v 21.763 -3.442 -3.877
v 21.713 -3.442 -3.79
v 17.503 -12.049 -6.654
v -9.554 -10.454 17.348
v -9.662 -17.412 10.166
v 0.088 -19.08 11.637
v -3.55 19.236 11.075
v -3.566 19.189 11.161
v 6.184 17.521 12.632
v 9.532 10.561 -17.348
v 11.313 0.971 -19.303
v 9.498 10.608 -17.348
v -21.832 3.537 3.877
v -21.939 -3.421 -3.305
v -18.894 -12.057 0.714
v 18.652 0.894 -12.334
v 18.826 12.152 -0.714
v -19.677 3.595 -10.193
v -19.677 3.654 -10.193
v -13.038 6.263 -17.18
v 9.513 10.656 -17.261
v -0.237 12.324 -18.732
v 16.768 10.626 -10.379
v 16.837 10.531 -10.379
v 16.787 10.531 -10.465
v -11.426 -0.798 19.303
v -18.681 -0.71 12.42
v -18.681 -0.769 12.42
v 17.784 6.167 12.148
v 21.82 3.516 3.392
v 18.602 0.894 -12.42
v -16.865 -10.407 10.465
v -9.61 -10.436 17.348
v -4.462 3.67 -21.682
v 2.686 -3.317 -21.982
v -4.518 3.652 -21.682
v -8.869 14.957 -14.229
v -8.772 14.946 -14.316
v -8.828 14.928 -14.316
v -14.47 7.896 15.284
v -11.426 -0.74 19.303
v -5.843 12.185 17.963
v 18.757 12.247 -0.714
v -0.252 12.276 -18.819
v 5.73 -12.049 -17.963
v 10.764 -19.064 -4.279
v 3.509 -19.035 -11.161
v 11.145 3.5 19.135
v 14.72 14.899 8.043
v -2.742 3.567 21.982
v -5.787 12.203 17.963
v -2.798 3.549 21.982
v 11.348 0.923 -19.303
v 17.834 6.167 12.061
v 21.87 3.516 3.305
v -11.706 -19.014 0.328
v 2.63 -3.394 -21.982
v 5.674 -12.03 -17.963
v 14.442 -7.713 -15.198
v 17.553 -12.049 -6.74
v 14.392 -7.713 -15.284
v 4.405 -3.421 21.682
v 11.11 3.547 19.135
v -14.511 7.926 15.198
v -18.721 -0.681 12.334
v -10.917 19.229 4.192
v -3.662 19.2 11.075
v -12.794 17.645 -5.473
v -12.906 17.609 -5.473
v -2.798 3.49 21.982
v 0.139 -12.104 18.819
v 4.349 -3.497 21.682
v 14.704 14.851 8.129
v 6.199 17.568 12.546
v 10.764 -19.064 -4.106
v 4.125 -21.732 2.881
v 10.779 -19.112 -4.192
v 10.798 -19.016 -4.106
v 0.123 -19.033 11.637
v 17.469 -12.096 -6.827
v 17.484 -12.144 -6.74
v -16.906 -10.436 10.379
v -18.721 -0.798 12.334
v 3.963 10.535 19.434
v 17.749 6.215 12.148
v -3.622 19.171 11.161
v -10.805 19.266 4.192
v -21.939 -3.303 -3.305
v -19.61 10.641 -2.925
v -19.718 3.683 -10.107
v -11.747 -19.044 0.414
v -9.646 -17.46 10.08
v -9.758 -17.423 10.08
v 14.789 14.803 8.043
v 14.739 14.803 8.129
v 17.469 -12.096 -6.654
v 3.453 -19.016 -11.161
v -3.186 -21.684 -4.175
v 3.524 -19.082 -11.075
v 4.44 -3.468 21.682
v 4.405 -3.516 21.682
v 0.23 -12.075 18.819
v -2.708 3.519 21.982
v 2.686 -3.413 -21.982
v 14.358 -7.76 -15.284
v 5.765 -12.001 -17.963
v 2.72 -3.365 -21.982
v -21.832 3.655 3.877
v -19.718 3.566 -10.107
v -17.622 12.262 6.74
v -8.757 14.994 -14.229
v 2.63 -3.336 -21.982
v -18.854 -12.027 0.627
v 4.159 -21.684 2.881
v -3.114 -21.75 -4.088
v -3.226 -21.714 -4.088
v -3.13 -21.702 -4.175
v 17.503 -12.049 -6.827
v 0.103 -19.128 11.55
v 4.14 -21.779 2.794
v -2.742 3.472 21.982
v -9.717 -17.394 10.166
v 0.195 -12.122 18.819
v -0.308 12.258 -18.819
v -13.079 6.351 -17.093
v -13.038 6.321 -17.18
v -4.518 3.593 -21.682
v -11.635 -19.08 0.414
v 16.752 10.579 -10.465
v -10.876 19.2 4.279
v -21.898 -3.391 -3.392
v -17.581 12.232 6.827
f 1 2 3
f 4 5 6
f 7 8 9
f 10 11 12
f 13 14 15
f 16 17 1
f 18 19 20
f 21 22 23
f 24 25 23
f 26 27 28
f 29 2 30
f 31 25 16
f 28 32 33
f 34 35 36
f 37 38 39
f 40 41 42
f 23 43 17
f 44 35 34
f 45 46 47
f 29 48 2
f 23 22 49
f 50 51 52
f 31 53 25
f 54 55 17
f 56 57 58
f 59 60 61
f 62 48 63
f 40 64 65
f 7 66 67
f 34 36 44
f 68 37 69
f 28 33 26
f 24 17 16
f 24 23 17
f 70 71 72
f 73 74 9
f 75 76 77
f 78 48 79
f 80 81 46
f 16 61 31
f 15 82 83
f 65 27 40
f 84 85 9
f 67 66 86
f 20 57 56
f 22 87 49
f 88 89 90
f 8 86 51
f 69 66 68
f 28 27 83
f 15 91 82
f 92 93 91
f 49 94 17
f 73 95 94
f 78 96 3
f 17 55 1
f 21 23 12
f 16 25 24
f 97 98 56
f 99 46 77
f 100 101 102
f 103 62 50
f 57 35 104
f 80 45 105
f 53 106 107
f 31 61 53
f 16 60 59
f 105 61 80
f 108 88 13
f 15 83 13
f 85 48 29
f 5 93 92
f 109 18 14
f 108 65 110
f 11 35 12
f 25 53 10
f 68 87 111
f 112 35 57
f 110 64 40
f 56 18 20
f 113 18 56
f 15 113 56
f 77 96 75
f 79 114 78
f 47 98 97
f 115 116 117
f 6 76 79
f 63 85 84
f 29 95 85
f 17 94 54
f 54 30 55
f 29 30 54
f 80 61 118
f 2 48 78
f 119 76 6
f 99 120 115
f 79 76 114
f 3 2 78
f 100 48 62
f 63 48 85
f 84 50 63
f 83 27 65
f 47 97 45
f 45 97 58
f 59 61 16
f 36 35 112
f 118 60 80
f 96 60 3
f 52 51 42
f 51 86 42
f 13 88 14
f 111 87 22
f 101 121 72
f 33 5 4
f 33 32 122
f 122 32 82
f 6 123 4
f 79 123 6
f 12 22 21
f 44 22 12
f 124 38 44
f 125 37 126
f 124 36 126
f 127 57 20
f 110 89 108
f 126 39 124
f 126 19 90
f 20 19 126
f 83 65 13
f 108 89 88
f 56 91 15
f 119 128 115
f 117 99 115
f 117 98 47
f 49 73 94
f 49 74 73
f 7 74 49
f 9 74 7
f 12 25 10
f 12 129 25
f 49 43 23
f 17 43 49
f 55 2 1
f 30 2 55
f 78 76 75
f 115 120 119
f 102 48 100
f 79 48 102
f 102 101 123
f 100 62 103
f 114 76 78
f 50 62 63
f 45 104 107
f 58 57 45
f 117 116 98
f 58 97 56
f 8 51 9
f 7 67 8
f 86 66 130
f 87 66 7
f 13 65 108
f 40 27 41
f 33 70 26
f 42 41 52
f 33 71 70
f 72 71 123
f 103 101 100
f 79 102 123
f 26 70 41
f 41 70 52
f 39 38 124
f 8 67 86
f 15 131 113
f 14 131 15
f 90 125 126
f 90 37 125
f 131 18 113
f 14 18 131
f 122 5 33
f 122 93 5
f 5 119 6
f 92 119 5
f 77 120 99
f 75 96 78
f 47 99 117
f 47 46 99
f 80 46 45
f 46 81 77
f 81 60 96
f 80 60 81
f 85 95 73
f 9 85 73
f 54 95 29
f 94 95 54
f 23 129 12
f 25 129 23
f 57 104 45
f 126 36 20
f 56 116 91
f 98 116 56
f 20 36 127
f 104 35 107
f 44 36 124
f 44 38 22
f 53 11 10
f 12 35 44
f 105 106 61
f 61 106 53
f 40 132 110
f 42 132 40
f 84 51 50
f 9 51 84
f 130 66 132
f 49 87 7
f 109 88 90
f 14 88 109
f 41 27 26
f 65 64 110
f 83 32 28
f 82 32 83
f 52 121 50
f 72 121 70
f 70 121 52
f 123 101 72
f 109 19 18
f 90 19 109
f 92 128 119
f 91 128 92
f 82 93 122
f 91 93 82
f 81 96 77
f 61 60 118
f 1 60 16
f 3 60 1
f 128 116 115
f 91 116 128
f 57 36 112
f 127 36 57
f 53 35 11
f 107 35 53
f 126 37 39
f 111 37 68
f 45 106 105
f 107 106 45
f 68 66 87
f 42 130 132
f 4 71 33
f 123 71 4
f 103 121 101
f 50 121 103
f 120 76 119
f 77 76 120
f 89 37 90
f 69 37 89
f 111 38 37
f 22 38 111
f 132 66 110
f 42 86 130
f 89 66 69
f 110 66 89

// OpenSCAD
// Auto-generated OpenSCAD file

    inner_points = 10*[[2.1663170564831677, -0.34419785617257703, -0.38765607758297516], [-1.442996025981491, 0.7866986144158923, 1.519751628063399], [1.8552345149142868, 0.08938090208747582, -1.233372999913796], [-1.7540785675503718, 1.2202773726759453, 0.6740347057325782], [1.7453064030745096, -1.2048588295271065, -0.6740347057325782], [-1.864006679390149, -0.07396235893863715, 1.233372999913796], [1.4342238615056286, -0.7712800712670536, -1.519751628063399], [-2.1750892209590305, 0.35961639932141576, 0.38765607758297516], [1.468891681862331, 1.4803448655131184, 0.8042791895681101], [0.6168484423213675, 1.7473133080865888, 1.2545570689075638], [-0.31453806522834865, -2.1654735231978033, -0.4088401465767429], [-1.1665813047693123, -1.8985050806243329, 0.0414377327627109], [0.43898102104550846, -0.34681056725634735, 2.1595854401021617], [-0.026742532112712505, 1.2228900837597156, -1.873206811952559], [-0.8787857716536761, 1.489858526333186, -1.4229289326131052], [0.0179703676368501, -1.207471540610877, 1.873206811952559], [-0.44775318552137083, 0.36222911040518607, -2.1595854401021617], [-1.2997964250623344, 0.6291975529786564, -1.7093075607627082], [-1.1385344489428022, -0.0769022418107572, 1.921618159677706], [1.12976228446694, 0.09232078495959586, -1.921618159677706], [-1.9529591160768351, 1.0582216841140362, -0.29249748784533813], [1.872568425092638, 1.215193370477562, -0.07135759109804152], [-0.358109735910173, 1.914125827058532, 1.1074852013948724], [0.3493375714343106, -1.8987072839096932, -1.1074852013948724], [-1.8813405895685003, -1.1997748273287232, 0.07135759109804152], [1.1094776222383604, 0.34997776999835917, 1.9047907760005465], [0.007257421988691212, -1.903261911034367, 1.1550417938533186], [2.1770300021313265, 0.35159251425091276, 0.33050894051626534], [-0.5802398407923681, 1.2155205422659117, 1.7876387668231855], [1.673687876566175, 1.0531376819156528, -1.0378897846759576], [-1.0835819663575201, 1.9170657099306518, 0.4192400416309626], [1.0748098018816579, -1.9016471667818131, -0.4192400416309626], [-1.6824600410420372, -1.037719138766814, 1.0378897846759576], [0.5714676763165056, -1.200101999117073, -1.7876387668231855], [-2.185802166607189, -0.33617397110207403, -0.33050894051626534], [1.7733532589010197, 0.6167440092864692, 1.206145721182417], [0.3947183374391723, 1.0487080232939685, 1.9347106343358773], [0.4109341652189982, -2.168413406069923, 0.2794050131871669], [-0.9677007562428493, -1.736449392062424, 1.0079699263406272], [-0.2757782637536796, 0.35191968603926227, 2.1895052984374925], [0.948215646118828, 1.056077564787773, -1.7261349444398677], [-1.282462514883983, 1.7550100213687425, -0.5472921519469536], [-0.9569878105946905, -1.0406590216389342, 1.7261349444398677], [0.2670060992778172, -0.33650114289042354, -2.1895052984374925], [-1.9636720617249939, 0.3624313136905462, -1.0106625059445786]];

    outer_points = 10*[[1.269058091079478, 1.2537842356028754, 1.3429760346034532], [-1.1407886362053834, -1.916917683440805, -0.10047815641416535], [0.6269353347347499, 1.916917683440805, 0.9583562273355116], [-1.7829113925501114, -1.2537842356028754, -0.4850979636821068], [1.7829113925501114, 1.2537842356028754, 0.4850979636821068], [-0.6269353347347499, -1.916917683440805, -0.9583562273355116], [1.1407886362053834, 1.916917683440805, 0.10047815641416535], [-1.269058091079478, -1.2537842356028754, -1.3429760346034532], [-0.48285355807647146, 0.04268387072270685, 2.179701471792137], [-1.0517412010710958, -0.7058173185606367, 1.8389481603050128], [1.693863957415824, 0.04268387072270685, -1.4543283530370714], [1.1249763144211997, -0.7058173185606367, -1.7950816645241956], [0.8186673506552729, -1.7787897762393126, 1.073200204257045], [-1.3325206521259063, 1.7787897762393126, -0.21532213333569883], [-1.9014082951205304, 1.0302885869559693, -0.556075444822823], [1.3325206521259063, -1.7787897762393126, 0.21532213333569883], [-0.8186673506552729, 1.7787897762393126, -1.073200204257045], [-1.387554993649897, 1.0302885869559693, -1.4139535157441694], [-0.18857781353705078, -2.2221043244817307, -0.11295466728279542], [0.18857781353705078, 2.2221043244817307, 0.11295466728279542], [-1.8696770145973163, -0.48599841896512486, -1.1199023954567], [-0.1848857624061775, 0.979800777081756, 1.9979678850244973], [-1.6742529475459202, -0.979800777081756, 1.1058641337721262], [1.6742529475459202, 0.979800777081756, -1.1058641337721262], [0.1848857624061775, -0.979800777081756, -1.9979678850244973], [0.4889682744617646, -1.1996196766772678, 1.8187607416585618], [1.834253682943229, -1.1996196766772678, -0.42719320621671564], [0.7673250602621547, 0.6746141360408304, 1.9854913741558673], [-1.073634024028082, -1.7475865937195063, 0.8827904946253733], [-0.27165138445338266, 1.7475865937195063, 1.3631634532499042], [-2.112610468743619, -0.6746141360408304, 0.26046257371941006], [2.112610468743619, 0.6746141360408304, -0.26046257371941006], [0.27165138445338266, -1.7475865937195063, -1.3631634532499042], [1.073634024028082, 1.7475865937195063, -0.8827904946253733], [-0.7673250602621547, -0.6746141360408304, -1.9854913741558673], [0.469357264591861, -0.26250277031821867, 2.167224960923507], [-0.4511222775532575, -1.473603135198387, 1.6158745211582601], [2.1322214786135234, -0.26250277031821867, -0.6089267929843553], [1.2117419364684048, -1.473603135198387, -1.1602772327496023], [-0.12142320135974954, -2.0527732347604317, 0.8703139837567432], [-0.7100089056510817, 2.0527732347604317, 0.517761893197188], [-2.1993760907908246, 0.09317168059691994, -0.3743418580551833], [0.7100089056510817, -2.0527732347604317, -0.517761893197188], [0.12142320135974954, 2.0527732347604317, -0.8703139837567432], [-1.3679439837799934, 0.09317168059691994, -1.7624177350091146]];

    // Convex hull for inner set (I)
    module inner_hull() {
        hull() {
            for (p = inner_points) {
                translate(p) sphere(r=0.1);
            }
        }
    }

    // Convex hull for outer set (O) minus inner hull (O \ I)
    module outer_minus_inner() {
        difference() {
            hull() {
                for (p = outer_points) {
                    translate(p) sphere(r=0.1);
                }
            }
            inner_hull(); // Subtract inner hull
        }
    }

    // Convex hull for outer set (O) minus all translated inner hulls
    module outer_minus_AllTranslationInner() {
        difference() {
            hull() {
                for (p = outer_points) {
                    translate(p) sphere(r=0.1);
                }
            }
            hull() {
                translate([0,0,50]) inner_hull();
                translate([0,0,-50]) inner_hull();
            }; // Subtract translated inner hulls
        }
    }

    // Difference between outer_minus_inner and outer_minus_AllTranslationInner
    module outer_minus_inner_diff() {
        difference() {
            // Outer minus inner
            difference() {
                hull() {
                    for (p = outer_points) {
                        translate(p) sphere(r=0.1);
                    }
                }
                inner_hull();
            }

            // Subtract Outer minus AllTranslationInner
            difference() {
                hull() {
                    for (p = outer_points) {
                        translate(p) sphere(r=0.1);
                    }
                }
                hull() {
                    translate([0,0,50]) inner_hull();
                    translate([0,0,-50]) inner_hull();
                };
            }
        }
    }

    // Rendering all with colors applied
    color([1, 0, 0, 0.5]) inner_hull(); // Transparent red
    
